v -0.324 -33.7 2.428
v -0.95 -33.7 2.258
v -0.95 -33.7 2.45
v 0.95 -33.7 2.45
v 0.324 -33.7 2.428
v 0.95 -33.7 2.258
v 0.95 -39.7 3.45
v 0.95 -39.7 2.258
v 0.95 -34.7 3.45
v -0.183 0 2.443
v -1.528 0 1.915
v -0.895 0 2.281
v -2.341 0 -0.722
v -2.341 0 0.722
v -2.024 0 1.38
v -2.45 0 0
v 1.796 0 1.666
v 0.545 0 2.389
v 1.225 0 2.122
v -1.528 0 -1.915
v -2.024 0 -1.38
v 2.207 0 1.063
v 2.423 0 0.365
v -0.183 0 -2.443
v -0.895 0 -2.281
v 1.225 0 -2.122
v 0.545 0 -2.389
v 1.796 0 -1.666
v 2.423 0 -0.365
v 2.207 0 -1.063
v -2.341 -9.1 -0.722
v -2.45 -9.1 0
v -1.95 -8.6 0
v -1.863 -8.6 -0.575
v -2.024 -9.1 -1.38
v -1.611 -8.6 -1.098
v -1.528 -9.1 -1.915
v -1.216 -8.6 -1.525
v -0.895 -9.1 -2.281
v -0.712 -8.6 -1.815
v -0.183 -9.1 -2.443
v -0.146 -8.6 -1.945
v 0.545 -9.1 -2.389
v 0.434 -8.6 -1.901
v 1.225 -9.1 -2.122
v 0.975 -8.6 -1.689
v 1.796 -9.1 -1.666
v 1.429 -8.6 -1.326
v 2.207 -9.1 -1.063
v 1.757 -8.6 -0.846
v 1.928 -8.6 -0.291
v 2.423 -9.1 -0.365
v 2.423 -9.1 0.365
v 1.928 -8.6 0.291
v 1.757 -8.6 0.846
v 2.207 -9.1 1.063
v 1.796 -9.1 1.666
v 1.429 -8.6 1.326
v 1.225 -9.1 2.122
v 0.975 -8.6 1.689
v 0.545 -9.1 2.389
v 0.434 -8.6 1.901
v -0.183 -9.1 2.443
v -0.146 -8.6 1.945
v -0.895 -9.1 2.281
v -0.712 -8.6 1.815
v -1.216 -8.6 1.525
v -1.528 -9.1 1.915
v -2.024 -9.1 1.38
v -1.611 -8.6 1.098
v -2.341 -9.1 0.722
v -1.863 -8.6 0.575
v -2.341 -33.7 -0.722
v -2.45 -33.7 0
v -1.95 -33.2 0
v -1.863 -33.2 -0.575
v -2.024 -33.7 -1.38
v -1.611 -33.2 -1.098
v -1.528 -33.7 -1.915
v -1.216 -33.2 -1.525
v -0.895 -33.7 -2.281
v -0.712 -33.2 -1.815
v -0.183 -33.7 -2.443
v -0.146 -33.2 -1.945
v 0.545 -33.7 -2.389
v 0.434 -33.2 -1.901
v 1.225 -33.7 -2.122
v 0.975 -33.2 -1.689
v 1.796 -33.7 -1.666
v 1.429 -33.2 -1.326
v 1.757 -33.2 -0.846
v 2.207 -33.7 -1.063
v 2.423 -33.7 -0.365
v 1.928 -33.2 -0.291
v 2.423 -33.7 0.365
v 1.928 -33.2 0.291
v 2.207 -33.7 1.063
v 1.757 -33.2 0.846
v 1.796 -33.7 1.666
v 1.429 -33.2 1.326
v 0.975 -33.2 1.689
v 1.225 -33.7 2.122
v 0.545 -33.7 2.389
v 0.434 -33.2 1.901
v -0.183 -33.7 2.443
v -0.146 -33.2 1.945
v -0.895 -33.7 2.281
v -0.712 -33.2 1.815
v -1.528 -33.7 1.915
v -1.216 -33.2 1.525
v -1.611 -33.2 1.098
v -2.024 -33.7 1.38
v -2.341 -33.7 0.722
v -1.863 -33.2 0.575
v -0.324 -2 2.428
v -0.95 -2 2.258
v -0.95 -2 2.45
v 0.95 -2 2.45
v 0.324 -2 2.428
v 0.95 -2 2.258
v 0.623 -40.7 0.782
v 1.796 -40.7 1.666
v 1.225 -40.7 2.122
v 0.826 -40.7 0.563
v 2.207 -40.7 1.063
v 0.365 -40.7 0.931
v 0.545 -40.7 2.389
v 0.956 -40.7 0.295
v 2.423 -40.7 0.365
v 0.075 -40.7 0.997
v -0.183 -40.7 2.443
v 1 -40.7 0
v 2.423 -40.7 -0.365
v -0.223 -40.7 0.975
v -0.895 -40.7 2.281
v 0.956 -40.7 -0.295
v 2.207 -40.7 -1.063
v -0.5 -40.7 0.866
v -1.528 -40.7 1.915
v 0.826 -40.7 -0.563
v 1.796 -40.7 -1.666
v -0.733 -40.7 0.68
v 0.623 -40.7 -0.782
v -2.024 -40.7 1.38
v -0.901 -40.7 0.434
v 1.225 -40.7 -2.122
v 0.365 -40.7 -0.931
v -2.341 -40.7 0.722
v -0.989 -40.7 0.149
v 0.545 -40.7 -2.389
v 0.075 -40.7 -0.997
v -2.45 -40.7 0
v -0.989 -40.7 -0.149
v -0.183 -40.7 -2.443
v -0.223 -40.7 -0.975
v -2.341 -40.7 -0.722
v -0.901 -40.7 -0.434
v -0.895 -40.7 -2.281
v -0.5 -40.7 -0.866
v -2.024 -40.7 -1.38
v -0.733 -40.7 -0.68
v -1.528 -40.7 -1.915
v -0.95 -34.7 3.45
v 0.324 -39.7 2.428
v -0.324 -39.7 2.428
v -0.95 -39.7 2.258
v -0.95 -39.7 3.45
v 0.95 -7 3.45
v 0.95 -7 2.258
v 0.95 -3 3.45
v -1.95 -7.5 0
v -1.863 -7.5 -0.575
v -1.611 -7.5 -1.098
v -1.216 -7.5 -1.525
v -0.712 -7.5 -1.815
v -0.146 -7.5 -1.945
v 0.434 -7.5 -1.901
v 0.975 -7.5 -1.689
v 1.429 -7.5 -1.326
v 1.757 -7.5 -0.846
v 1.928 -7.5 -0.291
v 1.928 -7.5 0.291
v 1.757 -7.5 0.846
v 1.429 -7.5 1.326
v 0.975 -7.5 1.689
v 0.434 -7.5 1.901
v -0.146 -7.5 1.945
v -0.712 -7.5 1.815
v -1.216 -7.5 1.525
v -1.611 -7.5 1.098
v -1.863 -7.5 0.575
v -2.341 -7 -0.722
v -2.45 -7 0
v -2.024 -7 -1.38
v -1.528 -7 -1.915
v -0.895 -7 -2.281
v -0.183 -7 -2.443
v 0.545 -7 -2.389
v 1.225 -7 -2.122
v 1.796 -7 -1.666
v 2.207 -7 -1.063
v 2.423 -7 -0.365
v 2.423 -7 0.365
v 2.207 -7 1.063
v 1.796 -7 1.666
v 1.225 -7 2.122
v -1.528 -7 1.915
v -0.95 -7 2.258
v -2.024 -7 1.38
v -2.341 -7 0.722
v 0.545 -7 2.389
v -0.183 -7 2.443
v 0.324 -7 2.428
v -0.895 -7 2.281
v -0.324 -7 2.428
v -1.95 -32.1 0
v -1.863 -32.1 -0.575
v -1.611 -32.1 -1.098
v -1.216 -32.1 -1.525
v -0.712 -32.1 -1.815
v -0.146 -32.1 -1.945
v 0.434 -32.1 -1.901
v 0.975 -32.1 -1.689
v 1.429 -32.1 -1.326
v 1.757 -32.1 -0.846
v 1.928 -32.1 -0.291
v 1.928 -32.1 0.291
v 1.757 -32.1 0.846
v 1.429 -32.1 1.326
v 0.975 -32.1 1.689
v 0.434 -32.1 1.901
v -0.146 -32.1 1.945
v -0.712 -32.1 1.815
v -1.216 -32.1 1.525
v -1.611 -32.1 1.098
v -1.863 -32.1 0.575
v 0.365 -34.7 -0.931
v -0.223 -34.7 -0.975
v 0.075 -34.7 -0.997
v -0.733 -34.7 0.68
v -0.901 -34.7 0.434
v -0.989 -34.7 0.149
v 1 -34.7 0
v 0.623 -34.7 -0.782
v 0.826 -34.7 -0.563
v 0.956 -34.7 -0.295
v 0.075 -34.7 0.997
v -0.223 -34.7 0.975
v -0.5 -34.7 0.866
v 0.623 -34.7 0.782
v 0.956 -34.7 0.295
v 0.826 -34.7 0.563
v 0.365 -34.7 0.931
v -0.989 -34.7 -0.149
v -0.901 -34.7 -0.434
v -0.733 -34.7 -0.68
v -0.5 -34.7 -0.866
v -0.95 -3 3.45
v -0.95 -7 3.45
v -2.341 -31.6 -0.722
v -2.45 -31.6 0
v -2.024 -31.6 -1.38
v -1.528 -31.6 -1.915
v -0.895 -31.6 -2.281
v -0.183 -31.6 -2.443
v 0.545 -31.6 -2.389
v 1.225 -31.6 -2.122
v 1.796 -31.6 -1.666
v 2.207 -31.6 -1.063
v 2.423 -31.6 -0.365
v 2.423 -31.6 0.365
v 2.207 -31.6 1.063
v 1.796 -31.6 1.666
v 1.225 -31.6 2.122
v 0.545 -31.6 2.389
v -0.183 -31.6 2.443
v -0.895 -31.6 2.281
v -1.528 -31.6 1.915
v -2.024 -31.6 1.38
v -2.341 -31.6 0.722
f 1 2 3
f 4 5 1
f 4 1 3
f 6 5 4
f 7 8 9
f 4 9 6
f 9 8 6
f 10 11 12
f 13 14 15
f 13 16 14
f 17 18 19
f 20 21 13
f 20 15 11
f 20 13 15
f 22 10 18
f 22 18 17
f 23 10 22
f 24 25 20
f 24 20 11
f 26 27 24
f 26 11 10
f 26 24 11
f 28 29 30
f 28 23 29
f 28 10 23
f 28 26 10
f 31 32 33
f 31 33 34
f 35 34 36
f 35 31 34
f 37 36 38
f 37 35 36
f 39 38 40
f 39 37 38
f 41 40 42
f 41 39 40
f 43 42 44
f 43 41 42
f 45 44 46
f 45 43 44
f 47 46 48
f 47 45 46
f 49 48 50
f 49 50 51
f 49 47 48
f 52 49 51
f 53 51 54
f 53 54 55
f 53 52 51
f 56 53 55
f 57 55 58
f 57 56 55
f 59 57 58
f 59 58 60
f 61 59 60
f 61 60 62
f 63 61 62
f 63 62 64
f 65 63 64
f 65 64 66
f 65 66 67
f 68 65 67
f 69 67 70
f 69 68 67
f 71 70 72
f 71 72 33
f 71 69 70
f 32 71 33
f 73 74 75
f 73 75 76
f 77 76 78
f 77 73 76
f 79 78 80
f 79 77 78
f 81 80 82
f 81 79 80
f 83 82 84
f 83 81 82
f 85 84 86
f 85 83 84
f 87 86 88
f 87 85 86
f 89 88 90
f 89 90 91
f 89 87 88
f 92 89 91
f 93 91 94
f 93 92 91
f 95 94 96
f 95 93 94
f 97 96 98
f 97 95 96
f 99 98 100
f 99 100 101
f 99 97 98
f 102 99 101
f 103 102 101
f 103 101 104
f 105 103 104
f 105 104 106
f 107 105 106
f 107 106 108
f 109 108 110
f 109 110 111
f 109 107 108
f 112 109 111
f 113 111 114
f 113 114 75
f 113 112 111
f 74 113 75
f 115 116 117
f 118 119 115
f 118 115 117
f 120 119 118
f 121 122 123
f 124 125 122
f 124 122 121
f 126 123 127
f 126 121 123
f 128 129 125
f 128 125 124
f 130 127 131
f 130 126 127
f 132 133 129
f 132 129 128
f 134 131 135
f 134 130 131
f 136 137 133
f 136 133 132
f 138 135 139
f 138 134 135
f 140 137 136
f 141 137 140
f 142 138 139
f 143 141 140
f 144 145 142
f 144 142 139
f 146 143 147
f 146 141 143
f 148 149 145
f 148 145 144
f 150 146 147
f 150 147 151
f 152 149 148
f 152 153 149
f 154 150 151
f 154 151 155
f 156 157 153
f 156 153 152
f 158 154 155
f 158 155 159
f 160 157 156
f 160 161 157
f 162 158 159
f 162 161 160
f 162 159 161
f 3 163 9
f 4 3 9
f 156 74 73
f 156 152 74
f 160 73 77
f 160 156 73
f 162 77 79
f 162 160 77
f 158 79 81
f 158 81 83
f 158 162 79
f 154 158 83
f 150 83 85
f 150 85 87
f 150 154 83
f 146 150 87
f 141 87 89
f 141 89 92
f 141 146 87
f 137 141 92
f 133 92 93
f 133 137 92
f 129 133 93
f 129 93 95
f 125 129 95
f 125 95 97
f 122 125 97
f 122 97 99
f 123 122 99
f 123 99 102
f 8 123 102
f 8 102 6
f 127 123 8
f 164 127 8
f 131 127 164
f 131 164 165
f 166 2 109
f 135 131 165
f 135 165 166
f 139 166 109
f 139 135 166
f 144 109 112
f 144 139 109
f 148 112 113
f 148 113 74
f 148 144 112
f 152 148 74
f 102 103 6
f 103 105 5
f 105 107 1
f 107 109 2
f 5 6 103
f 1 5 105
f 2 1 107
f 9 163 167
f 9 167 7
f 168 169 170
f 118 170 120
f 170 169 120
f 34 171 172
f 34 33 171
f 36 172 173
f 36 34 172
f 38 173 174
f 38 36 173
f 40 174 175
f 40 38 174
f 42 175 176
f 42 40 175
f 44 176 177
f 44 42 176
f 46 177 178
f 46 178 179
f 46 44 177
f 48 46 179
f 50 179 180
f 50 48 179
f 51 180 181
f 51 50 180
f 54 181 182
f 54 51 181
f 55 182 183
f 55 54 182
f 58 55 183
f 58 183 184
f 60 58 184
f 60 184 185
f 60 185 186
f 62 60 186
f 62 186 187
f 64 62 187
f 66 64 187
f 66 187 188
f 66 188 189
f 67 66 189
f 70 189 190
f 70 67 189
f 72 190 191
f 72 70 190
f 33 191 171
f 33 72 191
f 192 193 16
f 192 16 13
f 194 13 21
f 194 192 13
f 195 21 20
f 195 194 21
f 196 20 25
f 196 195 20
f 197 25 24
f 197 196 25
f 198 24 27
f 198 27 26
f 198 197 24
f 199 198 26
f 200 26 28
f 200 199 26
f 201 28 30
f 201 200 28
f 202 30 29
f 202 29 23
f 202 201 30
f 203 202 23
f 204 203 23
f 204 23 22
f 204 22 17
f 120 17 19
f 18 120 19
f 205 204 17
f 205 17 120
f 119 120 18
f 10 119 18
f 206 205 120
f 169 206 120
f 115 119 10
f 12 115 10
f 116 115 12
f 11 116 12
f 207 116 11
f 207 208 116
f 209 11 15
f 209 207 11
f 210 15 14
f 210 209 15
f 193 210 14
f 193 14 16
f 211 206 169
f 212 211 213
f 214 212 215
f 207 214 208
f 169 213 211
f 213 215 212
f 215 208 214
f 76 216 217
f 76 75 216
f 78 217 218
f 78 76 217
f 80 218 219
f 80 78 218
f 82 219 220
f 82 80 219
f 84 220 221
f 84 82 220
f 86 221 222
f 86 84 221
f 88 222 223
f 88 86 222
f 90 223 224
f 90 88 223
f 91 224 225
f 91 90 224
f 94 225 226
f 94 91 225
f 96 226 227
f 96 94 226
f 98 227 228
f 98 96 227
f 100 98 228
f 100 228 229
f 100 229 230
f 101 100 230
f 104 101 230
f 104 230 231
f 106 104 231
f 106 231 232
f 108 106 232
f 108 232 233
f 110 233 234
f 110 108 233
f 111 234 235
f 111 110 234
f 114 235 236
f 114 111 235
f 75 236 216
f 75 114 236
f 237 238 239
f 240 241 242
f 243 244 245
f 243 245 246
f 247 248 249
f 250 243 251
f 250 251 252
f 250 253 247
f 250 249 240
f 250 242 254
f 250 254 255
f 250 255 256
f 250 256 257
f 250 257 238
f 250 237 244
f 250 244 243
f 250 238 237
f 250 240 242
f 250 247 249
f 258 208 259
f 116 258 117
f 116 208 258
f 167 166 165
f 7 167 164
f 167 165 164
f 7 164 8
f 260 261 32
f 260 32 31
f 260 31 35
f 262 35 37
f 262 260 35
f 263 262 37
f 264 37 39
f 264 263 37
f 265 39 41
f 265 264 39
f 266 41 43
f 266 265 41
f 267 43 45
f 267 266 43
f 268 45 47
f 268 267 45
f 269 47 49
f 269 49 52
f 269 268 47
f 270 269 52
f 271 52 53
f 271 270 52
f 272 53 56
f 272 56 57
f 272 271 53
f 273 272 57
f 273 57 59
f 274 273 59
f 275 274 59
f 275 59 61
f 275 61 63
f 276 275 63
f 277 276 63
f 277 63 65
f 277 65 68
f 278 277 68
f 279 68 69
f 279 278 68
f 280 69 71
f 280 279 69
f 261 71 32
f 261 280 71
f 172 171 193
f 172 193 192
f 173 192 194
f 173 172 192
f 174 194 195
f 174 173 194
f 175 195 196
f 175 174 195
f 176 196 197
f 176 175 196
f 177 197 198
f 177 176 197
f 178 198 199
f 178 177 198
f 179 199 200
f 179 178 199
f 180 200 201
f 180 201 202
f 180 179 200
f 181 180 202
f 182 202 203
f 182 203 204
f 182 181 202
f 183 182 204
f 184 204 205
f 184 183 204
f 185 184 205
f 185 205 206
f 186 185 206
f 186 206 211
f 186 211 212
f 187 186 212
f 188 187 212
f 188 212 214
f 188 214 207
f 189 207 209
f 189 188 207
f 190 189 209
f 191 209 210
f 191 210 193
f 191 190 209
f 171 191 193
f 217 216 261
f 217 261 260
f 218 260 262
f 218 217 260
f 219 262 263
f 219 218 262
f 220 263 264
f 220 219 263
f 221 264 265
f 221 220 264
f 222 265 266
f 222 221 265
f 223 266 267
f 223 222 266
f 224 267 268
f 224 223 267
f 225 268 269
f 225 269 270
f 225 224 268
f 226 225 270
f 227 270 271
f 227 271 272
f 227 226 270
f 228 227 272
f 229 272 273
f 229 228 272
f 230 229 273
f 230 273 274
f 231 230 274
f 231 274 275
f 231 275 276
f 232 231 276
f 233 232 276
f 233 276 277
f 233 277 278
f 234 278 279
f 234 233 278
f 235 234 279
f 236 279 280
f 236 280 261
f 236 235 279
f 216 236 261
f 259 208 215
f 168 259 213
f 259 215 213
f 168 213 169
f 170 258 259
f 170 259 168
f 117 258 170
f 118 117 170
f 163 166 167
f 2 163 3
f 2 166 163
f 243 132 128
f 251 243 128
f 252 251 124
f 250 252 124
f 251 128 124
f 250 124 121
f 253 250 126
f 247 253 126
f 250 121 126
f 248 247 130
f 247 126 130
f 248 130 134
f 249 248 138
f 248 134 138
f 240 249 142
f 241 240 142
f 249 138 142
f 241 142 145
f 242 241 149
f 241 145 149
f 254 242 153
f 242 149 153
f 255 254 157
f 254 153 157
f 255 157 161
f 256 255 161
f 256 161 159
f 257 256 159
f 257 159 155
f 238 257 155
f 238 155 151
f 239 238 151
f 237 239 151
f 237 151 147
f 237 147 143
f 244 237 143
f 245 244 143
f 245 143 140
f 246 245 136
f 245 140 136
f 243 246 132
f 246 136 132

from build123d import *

# Parameters (mm, degrees)
F3_SIZE  = 0.49999
F1_W     = 1.9
F1_H     = 5
F1_H_2   = 6
F4_DEPTH = 3.45
F5_SIZE  = 0.99999
F6_R     = 1
F7_DEPTH = 6


# Not quite as in the source:
# - a fillet or chamfer is up to 0.001 mm smaller than in the source, because OpenCascade refuses the exact size


with BuildPart() as f2:
    # F0 (on Top) → F2 (revolve)
    with BuildSketch(Plane.XY):
        Polygon((0, -40.7), (0, 0), (-2.45, 0), (-2.45, -7.5), (-1.95, -7.5), (-1.95, -8.6), (-2.45, -8.6), (-2.45, -32.1), (-1.95, -32.1), (-1.95, -33.2), (-2.45, -33.2), (-2.45, -40.7), align=None)
    revolve(axis=Axis((0, -15.1539987261, 0), (0, -1, 0)))

    # F3 (size 0.5 in the source; OpenCascade refuses exactly that, so slightly less here)
    f3_edges = [f2.edges().sort_by_distance(p)[0] for p in [
        (2.45, -8.6, 0),
        (2.45, -33.2, 0),
        (2.45, -7.5, 0),
        (2.45, -32.1, 0),
    ]]
    chamfer(f3_edges, length=F3_SIZE)

    # F1 (on Top) → F4 (join)
    with BuildSketch(Plane.XY):
        with Locations((0, -4.5)):
            Rectangle(F1_W, F1_H)
        with Locations((0, -36.7)):
            Rectangle(F1_W, F1_H_2)
    extrude(amount=F4_DEPTH)

    # F5 (size 1 in the source; OpenCascade refuses exactly that, so slightly less here)
    f5_edges = [f2.edges().sort_by_distance(p)[0] for p in [
        (0, -33.7, 3.45),
        (0, -2, 3.45),
    ]]
    chamfer(f5_edges, length=F5_SIZE)

    # F6 (on face) → F7 (cut)
    with BuildSketch(Plane.XZ.offset(40.7)):
        Circle(F6_R)
    extrude(amount=-F7_DEPTH, mode=Mode.SUBTRACT)


solid = f2.part
